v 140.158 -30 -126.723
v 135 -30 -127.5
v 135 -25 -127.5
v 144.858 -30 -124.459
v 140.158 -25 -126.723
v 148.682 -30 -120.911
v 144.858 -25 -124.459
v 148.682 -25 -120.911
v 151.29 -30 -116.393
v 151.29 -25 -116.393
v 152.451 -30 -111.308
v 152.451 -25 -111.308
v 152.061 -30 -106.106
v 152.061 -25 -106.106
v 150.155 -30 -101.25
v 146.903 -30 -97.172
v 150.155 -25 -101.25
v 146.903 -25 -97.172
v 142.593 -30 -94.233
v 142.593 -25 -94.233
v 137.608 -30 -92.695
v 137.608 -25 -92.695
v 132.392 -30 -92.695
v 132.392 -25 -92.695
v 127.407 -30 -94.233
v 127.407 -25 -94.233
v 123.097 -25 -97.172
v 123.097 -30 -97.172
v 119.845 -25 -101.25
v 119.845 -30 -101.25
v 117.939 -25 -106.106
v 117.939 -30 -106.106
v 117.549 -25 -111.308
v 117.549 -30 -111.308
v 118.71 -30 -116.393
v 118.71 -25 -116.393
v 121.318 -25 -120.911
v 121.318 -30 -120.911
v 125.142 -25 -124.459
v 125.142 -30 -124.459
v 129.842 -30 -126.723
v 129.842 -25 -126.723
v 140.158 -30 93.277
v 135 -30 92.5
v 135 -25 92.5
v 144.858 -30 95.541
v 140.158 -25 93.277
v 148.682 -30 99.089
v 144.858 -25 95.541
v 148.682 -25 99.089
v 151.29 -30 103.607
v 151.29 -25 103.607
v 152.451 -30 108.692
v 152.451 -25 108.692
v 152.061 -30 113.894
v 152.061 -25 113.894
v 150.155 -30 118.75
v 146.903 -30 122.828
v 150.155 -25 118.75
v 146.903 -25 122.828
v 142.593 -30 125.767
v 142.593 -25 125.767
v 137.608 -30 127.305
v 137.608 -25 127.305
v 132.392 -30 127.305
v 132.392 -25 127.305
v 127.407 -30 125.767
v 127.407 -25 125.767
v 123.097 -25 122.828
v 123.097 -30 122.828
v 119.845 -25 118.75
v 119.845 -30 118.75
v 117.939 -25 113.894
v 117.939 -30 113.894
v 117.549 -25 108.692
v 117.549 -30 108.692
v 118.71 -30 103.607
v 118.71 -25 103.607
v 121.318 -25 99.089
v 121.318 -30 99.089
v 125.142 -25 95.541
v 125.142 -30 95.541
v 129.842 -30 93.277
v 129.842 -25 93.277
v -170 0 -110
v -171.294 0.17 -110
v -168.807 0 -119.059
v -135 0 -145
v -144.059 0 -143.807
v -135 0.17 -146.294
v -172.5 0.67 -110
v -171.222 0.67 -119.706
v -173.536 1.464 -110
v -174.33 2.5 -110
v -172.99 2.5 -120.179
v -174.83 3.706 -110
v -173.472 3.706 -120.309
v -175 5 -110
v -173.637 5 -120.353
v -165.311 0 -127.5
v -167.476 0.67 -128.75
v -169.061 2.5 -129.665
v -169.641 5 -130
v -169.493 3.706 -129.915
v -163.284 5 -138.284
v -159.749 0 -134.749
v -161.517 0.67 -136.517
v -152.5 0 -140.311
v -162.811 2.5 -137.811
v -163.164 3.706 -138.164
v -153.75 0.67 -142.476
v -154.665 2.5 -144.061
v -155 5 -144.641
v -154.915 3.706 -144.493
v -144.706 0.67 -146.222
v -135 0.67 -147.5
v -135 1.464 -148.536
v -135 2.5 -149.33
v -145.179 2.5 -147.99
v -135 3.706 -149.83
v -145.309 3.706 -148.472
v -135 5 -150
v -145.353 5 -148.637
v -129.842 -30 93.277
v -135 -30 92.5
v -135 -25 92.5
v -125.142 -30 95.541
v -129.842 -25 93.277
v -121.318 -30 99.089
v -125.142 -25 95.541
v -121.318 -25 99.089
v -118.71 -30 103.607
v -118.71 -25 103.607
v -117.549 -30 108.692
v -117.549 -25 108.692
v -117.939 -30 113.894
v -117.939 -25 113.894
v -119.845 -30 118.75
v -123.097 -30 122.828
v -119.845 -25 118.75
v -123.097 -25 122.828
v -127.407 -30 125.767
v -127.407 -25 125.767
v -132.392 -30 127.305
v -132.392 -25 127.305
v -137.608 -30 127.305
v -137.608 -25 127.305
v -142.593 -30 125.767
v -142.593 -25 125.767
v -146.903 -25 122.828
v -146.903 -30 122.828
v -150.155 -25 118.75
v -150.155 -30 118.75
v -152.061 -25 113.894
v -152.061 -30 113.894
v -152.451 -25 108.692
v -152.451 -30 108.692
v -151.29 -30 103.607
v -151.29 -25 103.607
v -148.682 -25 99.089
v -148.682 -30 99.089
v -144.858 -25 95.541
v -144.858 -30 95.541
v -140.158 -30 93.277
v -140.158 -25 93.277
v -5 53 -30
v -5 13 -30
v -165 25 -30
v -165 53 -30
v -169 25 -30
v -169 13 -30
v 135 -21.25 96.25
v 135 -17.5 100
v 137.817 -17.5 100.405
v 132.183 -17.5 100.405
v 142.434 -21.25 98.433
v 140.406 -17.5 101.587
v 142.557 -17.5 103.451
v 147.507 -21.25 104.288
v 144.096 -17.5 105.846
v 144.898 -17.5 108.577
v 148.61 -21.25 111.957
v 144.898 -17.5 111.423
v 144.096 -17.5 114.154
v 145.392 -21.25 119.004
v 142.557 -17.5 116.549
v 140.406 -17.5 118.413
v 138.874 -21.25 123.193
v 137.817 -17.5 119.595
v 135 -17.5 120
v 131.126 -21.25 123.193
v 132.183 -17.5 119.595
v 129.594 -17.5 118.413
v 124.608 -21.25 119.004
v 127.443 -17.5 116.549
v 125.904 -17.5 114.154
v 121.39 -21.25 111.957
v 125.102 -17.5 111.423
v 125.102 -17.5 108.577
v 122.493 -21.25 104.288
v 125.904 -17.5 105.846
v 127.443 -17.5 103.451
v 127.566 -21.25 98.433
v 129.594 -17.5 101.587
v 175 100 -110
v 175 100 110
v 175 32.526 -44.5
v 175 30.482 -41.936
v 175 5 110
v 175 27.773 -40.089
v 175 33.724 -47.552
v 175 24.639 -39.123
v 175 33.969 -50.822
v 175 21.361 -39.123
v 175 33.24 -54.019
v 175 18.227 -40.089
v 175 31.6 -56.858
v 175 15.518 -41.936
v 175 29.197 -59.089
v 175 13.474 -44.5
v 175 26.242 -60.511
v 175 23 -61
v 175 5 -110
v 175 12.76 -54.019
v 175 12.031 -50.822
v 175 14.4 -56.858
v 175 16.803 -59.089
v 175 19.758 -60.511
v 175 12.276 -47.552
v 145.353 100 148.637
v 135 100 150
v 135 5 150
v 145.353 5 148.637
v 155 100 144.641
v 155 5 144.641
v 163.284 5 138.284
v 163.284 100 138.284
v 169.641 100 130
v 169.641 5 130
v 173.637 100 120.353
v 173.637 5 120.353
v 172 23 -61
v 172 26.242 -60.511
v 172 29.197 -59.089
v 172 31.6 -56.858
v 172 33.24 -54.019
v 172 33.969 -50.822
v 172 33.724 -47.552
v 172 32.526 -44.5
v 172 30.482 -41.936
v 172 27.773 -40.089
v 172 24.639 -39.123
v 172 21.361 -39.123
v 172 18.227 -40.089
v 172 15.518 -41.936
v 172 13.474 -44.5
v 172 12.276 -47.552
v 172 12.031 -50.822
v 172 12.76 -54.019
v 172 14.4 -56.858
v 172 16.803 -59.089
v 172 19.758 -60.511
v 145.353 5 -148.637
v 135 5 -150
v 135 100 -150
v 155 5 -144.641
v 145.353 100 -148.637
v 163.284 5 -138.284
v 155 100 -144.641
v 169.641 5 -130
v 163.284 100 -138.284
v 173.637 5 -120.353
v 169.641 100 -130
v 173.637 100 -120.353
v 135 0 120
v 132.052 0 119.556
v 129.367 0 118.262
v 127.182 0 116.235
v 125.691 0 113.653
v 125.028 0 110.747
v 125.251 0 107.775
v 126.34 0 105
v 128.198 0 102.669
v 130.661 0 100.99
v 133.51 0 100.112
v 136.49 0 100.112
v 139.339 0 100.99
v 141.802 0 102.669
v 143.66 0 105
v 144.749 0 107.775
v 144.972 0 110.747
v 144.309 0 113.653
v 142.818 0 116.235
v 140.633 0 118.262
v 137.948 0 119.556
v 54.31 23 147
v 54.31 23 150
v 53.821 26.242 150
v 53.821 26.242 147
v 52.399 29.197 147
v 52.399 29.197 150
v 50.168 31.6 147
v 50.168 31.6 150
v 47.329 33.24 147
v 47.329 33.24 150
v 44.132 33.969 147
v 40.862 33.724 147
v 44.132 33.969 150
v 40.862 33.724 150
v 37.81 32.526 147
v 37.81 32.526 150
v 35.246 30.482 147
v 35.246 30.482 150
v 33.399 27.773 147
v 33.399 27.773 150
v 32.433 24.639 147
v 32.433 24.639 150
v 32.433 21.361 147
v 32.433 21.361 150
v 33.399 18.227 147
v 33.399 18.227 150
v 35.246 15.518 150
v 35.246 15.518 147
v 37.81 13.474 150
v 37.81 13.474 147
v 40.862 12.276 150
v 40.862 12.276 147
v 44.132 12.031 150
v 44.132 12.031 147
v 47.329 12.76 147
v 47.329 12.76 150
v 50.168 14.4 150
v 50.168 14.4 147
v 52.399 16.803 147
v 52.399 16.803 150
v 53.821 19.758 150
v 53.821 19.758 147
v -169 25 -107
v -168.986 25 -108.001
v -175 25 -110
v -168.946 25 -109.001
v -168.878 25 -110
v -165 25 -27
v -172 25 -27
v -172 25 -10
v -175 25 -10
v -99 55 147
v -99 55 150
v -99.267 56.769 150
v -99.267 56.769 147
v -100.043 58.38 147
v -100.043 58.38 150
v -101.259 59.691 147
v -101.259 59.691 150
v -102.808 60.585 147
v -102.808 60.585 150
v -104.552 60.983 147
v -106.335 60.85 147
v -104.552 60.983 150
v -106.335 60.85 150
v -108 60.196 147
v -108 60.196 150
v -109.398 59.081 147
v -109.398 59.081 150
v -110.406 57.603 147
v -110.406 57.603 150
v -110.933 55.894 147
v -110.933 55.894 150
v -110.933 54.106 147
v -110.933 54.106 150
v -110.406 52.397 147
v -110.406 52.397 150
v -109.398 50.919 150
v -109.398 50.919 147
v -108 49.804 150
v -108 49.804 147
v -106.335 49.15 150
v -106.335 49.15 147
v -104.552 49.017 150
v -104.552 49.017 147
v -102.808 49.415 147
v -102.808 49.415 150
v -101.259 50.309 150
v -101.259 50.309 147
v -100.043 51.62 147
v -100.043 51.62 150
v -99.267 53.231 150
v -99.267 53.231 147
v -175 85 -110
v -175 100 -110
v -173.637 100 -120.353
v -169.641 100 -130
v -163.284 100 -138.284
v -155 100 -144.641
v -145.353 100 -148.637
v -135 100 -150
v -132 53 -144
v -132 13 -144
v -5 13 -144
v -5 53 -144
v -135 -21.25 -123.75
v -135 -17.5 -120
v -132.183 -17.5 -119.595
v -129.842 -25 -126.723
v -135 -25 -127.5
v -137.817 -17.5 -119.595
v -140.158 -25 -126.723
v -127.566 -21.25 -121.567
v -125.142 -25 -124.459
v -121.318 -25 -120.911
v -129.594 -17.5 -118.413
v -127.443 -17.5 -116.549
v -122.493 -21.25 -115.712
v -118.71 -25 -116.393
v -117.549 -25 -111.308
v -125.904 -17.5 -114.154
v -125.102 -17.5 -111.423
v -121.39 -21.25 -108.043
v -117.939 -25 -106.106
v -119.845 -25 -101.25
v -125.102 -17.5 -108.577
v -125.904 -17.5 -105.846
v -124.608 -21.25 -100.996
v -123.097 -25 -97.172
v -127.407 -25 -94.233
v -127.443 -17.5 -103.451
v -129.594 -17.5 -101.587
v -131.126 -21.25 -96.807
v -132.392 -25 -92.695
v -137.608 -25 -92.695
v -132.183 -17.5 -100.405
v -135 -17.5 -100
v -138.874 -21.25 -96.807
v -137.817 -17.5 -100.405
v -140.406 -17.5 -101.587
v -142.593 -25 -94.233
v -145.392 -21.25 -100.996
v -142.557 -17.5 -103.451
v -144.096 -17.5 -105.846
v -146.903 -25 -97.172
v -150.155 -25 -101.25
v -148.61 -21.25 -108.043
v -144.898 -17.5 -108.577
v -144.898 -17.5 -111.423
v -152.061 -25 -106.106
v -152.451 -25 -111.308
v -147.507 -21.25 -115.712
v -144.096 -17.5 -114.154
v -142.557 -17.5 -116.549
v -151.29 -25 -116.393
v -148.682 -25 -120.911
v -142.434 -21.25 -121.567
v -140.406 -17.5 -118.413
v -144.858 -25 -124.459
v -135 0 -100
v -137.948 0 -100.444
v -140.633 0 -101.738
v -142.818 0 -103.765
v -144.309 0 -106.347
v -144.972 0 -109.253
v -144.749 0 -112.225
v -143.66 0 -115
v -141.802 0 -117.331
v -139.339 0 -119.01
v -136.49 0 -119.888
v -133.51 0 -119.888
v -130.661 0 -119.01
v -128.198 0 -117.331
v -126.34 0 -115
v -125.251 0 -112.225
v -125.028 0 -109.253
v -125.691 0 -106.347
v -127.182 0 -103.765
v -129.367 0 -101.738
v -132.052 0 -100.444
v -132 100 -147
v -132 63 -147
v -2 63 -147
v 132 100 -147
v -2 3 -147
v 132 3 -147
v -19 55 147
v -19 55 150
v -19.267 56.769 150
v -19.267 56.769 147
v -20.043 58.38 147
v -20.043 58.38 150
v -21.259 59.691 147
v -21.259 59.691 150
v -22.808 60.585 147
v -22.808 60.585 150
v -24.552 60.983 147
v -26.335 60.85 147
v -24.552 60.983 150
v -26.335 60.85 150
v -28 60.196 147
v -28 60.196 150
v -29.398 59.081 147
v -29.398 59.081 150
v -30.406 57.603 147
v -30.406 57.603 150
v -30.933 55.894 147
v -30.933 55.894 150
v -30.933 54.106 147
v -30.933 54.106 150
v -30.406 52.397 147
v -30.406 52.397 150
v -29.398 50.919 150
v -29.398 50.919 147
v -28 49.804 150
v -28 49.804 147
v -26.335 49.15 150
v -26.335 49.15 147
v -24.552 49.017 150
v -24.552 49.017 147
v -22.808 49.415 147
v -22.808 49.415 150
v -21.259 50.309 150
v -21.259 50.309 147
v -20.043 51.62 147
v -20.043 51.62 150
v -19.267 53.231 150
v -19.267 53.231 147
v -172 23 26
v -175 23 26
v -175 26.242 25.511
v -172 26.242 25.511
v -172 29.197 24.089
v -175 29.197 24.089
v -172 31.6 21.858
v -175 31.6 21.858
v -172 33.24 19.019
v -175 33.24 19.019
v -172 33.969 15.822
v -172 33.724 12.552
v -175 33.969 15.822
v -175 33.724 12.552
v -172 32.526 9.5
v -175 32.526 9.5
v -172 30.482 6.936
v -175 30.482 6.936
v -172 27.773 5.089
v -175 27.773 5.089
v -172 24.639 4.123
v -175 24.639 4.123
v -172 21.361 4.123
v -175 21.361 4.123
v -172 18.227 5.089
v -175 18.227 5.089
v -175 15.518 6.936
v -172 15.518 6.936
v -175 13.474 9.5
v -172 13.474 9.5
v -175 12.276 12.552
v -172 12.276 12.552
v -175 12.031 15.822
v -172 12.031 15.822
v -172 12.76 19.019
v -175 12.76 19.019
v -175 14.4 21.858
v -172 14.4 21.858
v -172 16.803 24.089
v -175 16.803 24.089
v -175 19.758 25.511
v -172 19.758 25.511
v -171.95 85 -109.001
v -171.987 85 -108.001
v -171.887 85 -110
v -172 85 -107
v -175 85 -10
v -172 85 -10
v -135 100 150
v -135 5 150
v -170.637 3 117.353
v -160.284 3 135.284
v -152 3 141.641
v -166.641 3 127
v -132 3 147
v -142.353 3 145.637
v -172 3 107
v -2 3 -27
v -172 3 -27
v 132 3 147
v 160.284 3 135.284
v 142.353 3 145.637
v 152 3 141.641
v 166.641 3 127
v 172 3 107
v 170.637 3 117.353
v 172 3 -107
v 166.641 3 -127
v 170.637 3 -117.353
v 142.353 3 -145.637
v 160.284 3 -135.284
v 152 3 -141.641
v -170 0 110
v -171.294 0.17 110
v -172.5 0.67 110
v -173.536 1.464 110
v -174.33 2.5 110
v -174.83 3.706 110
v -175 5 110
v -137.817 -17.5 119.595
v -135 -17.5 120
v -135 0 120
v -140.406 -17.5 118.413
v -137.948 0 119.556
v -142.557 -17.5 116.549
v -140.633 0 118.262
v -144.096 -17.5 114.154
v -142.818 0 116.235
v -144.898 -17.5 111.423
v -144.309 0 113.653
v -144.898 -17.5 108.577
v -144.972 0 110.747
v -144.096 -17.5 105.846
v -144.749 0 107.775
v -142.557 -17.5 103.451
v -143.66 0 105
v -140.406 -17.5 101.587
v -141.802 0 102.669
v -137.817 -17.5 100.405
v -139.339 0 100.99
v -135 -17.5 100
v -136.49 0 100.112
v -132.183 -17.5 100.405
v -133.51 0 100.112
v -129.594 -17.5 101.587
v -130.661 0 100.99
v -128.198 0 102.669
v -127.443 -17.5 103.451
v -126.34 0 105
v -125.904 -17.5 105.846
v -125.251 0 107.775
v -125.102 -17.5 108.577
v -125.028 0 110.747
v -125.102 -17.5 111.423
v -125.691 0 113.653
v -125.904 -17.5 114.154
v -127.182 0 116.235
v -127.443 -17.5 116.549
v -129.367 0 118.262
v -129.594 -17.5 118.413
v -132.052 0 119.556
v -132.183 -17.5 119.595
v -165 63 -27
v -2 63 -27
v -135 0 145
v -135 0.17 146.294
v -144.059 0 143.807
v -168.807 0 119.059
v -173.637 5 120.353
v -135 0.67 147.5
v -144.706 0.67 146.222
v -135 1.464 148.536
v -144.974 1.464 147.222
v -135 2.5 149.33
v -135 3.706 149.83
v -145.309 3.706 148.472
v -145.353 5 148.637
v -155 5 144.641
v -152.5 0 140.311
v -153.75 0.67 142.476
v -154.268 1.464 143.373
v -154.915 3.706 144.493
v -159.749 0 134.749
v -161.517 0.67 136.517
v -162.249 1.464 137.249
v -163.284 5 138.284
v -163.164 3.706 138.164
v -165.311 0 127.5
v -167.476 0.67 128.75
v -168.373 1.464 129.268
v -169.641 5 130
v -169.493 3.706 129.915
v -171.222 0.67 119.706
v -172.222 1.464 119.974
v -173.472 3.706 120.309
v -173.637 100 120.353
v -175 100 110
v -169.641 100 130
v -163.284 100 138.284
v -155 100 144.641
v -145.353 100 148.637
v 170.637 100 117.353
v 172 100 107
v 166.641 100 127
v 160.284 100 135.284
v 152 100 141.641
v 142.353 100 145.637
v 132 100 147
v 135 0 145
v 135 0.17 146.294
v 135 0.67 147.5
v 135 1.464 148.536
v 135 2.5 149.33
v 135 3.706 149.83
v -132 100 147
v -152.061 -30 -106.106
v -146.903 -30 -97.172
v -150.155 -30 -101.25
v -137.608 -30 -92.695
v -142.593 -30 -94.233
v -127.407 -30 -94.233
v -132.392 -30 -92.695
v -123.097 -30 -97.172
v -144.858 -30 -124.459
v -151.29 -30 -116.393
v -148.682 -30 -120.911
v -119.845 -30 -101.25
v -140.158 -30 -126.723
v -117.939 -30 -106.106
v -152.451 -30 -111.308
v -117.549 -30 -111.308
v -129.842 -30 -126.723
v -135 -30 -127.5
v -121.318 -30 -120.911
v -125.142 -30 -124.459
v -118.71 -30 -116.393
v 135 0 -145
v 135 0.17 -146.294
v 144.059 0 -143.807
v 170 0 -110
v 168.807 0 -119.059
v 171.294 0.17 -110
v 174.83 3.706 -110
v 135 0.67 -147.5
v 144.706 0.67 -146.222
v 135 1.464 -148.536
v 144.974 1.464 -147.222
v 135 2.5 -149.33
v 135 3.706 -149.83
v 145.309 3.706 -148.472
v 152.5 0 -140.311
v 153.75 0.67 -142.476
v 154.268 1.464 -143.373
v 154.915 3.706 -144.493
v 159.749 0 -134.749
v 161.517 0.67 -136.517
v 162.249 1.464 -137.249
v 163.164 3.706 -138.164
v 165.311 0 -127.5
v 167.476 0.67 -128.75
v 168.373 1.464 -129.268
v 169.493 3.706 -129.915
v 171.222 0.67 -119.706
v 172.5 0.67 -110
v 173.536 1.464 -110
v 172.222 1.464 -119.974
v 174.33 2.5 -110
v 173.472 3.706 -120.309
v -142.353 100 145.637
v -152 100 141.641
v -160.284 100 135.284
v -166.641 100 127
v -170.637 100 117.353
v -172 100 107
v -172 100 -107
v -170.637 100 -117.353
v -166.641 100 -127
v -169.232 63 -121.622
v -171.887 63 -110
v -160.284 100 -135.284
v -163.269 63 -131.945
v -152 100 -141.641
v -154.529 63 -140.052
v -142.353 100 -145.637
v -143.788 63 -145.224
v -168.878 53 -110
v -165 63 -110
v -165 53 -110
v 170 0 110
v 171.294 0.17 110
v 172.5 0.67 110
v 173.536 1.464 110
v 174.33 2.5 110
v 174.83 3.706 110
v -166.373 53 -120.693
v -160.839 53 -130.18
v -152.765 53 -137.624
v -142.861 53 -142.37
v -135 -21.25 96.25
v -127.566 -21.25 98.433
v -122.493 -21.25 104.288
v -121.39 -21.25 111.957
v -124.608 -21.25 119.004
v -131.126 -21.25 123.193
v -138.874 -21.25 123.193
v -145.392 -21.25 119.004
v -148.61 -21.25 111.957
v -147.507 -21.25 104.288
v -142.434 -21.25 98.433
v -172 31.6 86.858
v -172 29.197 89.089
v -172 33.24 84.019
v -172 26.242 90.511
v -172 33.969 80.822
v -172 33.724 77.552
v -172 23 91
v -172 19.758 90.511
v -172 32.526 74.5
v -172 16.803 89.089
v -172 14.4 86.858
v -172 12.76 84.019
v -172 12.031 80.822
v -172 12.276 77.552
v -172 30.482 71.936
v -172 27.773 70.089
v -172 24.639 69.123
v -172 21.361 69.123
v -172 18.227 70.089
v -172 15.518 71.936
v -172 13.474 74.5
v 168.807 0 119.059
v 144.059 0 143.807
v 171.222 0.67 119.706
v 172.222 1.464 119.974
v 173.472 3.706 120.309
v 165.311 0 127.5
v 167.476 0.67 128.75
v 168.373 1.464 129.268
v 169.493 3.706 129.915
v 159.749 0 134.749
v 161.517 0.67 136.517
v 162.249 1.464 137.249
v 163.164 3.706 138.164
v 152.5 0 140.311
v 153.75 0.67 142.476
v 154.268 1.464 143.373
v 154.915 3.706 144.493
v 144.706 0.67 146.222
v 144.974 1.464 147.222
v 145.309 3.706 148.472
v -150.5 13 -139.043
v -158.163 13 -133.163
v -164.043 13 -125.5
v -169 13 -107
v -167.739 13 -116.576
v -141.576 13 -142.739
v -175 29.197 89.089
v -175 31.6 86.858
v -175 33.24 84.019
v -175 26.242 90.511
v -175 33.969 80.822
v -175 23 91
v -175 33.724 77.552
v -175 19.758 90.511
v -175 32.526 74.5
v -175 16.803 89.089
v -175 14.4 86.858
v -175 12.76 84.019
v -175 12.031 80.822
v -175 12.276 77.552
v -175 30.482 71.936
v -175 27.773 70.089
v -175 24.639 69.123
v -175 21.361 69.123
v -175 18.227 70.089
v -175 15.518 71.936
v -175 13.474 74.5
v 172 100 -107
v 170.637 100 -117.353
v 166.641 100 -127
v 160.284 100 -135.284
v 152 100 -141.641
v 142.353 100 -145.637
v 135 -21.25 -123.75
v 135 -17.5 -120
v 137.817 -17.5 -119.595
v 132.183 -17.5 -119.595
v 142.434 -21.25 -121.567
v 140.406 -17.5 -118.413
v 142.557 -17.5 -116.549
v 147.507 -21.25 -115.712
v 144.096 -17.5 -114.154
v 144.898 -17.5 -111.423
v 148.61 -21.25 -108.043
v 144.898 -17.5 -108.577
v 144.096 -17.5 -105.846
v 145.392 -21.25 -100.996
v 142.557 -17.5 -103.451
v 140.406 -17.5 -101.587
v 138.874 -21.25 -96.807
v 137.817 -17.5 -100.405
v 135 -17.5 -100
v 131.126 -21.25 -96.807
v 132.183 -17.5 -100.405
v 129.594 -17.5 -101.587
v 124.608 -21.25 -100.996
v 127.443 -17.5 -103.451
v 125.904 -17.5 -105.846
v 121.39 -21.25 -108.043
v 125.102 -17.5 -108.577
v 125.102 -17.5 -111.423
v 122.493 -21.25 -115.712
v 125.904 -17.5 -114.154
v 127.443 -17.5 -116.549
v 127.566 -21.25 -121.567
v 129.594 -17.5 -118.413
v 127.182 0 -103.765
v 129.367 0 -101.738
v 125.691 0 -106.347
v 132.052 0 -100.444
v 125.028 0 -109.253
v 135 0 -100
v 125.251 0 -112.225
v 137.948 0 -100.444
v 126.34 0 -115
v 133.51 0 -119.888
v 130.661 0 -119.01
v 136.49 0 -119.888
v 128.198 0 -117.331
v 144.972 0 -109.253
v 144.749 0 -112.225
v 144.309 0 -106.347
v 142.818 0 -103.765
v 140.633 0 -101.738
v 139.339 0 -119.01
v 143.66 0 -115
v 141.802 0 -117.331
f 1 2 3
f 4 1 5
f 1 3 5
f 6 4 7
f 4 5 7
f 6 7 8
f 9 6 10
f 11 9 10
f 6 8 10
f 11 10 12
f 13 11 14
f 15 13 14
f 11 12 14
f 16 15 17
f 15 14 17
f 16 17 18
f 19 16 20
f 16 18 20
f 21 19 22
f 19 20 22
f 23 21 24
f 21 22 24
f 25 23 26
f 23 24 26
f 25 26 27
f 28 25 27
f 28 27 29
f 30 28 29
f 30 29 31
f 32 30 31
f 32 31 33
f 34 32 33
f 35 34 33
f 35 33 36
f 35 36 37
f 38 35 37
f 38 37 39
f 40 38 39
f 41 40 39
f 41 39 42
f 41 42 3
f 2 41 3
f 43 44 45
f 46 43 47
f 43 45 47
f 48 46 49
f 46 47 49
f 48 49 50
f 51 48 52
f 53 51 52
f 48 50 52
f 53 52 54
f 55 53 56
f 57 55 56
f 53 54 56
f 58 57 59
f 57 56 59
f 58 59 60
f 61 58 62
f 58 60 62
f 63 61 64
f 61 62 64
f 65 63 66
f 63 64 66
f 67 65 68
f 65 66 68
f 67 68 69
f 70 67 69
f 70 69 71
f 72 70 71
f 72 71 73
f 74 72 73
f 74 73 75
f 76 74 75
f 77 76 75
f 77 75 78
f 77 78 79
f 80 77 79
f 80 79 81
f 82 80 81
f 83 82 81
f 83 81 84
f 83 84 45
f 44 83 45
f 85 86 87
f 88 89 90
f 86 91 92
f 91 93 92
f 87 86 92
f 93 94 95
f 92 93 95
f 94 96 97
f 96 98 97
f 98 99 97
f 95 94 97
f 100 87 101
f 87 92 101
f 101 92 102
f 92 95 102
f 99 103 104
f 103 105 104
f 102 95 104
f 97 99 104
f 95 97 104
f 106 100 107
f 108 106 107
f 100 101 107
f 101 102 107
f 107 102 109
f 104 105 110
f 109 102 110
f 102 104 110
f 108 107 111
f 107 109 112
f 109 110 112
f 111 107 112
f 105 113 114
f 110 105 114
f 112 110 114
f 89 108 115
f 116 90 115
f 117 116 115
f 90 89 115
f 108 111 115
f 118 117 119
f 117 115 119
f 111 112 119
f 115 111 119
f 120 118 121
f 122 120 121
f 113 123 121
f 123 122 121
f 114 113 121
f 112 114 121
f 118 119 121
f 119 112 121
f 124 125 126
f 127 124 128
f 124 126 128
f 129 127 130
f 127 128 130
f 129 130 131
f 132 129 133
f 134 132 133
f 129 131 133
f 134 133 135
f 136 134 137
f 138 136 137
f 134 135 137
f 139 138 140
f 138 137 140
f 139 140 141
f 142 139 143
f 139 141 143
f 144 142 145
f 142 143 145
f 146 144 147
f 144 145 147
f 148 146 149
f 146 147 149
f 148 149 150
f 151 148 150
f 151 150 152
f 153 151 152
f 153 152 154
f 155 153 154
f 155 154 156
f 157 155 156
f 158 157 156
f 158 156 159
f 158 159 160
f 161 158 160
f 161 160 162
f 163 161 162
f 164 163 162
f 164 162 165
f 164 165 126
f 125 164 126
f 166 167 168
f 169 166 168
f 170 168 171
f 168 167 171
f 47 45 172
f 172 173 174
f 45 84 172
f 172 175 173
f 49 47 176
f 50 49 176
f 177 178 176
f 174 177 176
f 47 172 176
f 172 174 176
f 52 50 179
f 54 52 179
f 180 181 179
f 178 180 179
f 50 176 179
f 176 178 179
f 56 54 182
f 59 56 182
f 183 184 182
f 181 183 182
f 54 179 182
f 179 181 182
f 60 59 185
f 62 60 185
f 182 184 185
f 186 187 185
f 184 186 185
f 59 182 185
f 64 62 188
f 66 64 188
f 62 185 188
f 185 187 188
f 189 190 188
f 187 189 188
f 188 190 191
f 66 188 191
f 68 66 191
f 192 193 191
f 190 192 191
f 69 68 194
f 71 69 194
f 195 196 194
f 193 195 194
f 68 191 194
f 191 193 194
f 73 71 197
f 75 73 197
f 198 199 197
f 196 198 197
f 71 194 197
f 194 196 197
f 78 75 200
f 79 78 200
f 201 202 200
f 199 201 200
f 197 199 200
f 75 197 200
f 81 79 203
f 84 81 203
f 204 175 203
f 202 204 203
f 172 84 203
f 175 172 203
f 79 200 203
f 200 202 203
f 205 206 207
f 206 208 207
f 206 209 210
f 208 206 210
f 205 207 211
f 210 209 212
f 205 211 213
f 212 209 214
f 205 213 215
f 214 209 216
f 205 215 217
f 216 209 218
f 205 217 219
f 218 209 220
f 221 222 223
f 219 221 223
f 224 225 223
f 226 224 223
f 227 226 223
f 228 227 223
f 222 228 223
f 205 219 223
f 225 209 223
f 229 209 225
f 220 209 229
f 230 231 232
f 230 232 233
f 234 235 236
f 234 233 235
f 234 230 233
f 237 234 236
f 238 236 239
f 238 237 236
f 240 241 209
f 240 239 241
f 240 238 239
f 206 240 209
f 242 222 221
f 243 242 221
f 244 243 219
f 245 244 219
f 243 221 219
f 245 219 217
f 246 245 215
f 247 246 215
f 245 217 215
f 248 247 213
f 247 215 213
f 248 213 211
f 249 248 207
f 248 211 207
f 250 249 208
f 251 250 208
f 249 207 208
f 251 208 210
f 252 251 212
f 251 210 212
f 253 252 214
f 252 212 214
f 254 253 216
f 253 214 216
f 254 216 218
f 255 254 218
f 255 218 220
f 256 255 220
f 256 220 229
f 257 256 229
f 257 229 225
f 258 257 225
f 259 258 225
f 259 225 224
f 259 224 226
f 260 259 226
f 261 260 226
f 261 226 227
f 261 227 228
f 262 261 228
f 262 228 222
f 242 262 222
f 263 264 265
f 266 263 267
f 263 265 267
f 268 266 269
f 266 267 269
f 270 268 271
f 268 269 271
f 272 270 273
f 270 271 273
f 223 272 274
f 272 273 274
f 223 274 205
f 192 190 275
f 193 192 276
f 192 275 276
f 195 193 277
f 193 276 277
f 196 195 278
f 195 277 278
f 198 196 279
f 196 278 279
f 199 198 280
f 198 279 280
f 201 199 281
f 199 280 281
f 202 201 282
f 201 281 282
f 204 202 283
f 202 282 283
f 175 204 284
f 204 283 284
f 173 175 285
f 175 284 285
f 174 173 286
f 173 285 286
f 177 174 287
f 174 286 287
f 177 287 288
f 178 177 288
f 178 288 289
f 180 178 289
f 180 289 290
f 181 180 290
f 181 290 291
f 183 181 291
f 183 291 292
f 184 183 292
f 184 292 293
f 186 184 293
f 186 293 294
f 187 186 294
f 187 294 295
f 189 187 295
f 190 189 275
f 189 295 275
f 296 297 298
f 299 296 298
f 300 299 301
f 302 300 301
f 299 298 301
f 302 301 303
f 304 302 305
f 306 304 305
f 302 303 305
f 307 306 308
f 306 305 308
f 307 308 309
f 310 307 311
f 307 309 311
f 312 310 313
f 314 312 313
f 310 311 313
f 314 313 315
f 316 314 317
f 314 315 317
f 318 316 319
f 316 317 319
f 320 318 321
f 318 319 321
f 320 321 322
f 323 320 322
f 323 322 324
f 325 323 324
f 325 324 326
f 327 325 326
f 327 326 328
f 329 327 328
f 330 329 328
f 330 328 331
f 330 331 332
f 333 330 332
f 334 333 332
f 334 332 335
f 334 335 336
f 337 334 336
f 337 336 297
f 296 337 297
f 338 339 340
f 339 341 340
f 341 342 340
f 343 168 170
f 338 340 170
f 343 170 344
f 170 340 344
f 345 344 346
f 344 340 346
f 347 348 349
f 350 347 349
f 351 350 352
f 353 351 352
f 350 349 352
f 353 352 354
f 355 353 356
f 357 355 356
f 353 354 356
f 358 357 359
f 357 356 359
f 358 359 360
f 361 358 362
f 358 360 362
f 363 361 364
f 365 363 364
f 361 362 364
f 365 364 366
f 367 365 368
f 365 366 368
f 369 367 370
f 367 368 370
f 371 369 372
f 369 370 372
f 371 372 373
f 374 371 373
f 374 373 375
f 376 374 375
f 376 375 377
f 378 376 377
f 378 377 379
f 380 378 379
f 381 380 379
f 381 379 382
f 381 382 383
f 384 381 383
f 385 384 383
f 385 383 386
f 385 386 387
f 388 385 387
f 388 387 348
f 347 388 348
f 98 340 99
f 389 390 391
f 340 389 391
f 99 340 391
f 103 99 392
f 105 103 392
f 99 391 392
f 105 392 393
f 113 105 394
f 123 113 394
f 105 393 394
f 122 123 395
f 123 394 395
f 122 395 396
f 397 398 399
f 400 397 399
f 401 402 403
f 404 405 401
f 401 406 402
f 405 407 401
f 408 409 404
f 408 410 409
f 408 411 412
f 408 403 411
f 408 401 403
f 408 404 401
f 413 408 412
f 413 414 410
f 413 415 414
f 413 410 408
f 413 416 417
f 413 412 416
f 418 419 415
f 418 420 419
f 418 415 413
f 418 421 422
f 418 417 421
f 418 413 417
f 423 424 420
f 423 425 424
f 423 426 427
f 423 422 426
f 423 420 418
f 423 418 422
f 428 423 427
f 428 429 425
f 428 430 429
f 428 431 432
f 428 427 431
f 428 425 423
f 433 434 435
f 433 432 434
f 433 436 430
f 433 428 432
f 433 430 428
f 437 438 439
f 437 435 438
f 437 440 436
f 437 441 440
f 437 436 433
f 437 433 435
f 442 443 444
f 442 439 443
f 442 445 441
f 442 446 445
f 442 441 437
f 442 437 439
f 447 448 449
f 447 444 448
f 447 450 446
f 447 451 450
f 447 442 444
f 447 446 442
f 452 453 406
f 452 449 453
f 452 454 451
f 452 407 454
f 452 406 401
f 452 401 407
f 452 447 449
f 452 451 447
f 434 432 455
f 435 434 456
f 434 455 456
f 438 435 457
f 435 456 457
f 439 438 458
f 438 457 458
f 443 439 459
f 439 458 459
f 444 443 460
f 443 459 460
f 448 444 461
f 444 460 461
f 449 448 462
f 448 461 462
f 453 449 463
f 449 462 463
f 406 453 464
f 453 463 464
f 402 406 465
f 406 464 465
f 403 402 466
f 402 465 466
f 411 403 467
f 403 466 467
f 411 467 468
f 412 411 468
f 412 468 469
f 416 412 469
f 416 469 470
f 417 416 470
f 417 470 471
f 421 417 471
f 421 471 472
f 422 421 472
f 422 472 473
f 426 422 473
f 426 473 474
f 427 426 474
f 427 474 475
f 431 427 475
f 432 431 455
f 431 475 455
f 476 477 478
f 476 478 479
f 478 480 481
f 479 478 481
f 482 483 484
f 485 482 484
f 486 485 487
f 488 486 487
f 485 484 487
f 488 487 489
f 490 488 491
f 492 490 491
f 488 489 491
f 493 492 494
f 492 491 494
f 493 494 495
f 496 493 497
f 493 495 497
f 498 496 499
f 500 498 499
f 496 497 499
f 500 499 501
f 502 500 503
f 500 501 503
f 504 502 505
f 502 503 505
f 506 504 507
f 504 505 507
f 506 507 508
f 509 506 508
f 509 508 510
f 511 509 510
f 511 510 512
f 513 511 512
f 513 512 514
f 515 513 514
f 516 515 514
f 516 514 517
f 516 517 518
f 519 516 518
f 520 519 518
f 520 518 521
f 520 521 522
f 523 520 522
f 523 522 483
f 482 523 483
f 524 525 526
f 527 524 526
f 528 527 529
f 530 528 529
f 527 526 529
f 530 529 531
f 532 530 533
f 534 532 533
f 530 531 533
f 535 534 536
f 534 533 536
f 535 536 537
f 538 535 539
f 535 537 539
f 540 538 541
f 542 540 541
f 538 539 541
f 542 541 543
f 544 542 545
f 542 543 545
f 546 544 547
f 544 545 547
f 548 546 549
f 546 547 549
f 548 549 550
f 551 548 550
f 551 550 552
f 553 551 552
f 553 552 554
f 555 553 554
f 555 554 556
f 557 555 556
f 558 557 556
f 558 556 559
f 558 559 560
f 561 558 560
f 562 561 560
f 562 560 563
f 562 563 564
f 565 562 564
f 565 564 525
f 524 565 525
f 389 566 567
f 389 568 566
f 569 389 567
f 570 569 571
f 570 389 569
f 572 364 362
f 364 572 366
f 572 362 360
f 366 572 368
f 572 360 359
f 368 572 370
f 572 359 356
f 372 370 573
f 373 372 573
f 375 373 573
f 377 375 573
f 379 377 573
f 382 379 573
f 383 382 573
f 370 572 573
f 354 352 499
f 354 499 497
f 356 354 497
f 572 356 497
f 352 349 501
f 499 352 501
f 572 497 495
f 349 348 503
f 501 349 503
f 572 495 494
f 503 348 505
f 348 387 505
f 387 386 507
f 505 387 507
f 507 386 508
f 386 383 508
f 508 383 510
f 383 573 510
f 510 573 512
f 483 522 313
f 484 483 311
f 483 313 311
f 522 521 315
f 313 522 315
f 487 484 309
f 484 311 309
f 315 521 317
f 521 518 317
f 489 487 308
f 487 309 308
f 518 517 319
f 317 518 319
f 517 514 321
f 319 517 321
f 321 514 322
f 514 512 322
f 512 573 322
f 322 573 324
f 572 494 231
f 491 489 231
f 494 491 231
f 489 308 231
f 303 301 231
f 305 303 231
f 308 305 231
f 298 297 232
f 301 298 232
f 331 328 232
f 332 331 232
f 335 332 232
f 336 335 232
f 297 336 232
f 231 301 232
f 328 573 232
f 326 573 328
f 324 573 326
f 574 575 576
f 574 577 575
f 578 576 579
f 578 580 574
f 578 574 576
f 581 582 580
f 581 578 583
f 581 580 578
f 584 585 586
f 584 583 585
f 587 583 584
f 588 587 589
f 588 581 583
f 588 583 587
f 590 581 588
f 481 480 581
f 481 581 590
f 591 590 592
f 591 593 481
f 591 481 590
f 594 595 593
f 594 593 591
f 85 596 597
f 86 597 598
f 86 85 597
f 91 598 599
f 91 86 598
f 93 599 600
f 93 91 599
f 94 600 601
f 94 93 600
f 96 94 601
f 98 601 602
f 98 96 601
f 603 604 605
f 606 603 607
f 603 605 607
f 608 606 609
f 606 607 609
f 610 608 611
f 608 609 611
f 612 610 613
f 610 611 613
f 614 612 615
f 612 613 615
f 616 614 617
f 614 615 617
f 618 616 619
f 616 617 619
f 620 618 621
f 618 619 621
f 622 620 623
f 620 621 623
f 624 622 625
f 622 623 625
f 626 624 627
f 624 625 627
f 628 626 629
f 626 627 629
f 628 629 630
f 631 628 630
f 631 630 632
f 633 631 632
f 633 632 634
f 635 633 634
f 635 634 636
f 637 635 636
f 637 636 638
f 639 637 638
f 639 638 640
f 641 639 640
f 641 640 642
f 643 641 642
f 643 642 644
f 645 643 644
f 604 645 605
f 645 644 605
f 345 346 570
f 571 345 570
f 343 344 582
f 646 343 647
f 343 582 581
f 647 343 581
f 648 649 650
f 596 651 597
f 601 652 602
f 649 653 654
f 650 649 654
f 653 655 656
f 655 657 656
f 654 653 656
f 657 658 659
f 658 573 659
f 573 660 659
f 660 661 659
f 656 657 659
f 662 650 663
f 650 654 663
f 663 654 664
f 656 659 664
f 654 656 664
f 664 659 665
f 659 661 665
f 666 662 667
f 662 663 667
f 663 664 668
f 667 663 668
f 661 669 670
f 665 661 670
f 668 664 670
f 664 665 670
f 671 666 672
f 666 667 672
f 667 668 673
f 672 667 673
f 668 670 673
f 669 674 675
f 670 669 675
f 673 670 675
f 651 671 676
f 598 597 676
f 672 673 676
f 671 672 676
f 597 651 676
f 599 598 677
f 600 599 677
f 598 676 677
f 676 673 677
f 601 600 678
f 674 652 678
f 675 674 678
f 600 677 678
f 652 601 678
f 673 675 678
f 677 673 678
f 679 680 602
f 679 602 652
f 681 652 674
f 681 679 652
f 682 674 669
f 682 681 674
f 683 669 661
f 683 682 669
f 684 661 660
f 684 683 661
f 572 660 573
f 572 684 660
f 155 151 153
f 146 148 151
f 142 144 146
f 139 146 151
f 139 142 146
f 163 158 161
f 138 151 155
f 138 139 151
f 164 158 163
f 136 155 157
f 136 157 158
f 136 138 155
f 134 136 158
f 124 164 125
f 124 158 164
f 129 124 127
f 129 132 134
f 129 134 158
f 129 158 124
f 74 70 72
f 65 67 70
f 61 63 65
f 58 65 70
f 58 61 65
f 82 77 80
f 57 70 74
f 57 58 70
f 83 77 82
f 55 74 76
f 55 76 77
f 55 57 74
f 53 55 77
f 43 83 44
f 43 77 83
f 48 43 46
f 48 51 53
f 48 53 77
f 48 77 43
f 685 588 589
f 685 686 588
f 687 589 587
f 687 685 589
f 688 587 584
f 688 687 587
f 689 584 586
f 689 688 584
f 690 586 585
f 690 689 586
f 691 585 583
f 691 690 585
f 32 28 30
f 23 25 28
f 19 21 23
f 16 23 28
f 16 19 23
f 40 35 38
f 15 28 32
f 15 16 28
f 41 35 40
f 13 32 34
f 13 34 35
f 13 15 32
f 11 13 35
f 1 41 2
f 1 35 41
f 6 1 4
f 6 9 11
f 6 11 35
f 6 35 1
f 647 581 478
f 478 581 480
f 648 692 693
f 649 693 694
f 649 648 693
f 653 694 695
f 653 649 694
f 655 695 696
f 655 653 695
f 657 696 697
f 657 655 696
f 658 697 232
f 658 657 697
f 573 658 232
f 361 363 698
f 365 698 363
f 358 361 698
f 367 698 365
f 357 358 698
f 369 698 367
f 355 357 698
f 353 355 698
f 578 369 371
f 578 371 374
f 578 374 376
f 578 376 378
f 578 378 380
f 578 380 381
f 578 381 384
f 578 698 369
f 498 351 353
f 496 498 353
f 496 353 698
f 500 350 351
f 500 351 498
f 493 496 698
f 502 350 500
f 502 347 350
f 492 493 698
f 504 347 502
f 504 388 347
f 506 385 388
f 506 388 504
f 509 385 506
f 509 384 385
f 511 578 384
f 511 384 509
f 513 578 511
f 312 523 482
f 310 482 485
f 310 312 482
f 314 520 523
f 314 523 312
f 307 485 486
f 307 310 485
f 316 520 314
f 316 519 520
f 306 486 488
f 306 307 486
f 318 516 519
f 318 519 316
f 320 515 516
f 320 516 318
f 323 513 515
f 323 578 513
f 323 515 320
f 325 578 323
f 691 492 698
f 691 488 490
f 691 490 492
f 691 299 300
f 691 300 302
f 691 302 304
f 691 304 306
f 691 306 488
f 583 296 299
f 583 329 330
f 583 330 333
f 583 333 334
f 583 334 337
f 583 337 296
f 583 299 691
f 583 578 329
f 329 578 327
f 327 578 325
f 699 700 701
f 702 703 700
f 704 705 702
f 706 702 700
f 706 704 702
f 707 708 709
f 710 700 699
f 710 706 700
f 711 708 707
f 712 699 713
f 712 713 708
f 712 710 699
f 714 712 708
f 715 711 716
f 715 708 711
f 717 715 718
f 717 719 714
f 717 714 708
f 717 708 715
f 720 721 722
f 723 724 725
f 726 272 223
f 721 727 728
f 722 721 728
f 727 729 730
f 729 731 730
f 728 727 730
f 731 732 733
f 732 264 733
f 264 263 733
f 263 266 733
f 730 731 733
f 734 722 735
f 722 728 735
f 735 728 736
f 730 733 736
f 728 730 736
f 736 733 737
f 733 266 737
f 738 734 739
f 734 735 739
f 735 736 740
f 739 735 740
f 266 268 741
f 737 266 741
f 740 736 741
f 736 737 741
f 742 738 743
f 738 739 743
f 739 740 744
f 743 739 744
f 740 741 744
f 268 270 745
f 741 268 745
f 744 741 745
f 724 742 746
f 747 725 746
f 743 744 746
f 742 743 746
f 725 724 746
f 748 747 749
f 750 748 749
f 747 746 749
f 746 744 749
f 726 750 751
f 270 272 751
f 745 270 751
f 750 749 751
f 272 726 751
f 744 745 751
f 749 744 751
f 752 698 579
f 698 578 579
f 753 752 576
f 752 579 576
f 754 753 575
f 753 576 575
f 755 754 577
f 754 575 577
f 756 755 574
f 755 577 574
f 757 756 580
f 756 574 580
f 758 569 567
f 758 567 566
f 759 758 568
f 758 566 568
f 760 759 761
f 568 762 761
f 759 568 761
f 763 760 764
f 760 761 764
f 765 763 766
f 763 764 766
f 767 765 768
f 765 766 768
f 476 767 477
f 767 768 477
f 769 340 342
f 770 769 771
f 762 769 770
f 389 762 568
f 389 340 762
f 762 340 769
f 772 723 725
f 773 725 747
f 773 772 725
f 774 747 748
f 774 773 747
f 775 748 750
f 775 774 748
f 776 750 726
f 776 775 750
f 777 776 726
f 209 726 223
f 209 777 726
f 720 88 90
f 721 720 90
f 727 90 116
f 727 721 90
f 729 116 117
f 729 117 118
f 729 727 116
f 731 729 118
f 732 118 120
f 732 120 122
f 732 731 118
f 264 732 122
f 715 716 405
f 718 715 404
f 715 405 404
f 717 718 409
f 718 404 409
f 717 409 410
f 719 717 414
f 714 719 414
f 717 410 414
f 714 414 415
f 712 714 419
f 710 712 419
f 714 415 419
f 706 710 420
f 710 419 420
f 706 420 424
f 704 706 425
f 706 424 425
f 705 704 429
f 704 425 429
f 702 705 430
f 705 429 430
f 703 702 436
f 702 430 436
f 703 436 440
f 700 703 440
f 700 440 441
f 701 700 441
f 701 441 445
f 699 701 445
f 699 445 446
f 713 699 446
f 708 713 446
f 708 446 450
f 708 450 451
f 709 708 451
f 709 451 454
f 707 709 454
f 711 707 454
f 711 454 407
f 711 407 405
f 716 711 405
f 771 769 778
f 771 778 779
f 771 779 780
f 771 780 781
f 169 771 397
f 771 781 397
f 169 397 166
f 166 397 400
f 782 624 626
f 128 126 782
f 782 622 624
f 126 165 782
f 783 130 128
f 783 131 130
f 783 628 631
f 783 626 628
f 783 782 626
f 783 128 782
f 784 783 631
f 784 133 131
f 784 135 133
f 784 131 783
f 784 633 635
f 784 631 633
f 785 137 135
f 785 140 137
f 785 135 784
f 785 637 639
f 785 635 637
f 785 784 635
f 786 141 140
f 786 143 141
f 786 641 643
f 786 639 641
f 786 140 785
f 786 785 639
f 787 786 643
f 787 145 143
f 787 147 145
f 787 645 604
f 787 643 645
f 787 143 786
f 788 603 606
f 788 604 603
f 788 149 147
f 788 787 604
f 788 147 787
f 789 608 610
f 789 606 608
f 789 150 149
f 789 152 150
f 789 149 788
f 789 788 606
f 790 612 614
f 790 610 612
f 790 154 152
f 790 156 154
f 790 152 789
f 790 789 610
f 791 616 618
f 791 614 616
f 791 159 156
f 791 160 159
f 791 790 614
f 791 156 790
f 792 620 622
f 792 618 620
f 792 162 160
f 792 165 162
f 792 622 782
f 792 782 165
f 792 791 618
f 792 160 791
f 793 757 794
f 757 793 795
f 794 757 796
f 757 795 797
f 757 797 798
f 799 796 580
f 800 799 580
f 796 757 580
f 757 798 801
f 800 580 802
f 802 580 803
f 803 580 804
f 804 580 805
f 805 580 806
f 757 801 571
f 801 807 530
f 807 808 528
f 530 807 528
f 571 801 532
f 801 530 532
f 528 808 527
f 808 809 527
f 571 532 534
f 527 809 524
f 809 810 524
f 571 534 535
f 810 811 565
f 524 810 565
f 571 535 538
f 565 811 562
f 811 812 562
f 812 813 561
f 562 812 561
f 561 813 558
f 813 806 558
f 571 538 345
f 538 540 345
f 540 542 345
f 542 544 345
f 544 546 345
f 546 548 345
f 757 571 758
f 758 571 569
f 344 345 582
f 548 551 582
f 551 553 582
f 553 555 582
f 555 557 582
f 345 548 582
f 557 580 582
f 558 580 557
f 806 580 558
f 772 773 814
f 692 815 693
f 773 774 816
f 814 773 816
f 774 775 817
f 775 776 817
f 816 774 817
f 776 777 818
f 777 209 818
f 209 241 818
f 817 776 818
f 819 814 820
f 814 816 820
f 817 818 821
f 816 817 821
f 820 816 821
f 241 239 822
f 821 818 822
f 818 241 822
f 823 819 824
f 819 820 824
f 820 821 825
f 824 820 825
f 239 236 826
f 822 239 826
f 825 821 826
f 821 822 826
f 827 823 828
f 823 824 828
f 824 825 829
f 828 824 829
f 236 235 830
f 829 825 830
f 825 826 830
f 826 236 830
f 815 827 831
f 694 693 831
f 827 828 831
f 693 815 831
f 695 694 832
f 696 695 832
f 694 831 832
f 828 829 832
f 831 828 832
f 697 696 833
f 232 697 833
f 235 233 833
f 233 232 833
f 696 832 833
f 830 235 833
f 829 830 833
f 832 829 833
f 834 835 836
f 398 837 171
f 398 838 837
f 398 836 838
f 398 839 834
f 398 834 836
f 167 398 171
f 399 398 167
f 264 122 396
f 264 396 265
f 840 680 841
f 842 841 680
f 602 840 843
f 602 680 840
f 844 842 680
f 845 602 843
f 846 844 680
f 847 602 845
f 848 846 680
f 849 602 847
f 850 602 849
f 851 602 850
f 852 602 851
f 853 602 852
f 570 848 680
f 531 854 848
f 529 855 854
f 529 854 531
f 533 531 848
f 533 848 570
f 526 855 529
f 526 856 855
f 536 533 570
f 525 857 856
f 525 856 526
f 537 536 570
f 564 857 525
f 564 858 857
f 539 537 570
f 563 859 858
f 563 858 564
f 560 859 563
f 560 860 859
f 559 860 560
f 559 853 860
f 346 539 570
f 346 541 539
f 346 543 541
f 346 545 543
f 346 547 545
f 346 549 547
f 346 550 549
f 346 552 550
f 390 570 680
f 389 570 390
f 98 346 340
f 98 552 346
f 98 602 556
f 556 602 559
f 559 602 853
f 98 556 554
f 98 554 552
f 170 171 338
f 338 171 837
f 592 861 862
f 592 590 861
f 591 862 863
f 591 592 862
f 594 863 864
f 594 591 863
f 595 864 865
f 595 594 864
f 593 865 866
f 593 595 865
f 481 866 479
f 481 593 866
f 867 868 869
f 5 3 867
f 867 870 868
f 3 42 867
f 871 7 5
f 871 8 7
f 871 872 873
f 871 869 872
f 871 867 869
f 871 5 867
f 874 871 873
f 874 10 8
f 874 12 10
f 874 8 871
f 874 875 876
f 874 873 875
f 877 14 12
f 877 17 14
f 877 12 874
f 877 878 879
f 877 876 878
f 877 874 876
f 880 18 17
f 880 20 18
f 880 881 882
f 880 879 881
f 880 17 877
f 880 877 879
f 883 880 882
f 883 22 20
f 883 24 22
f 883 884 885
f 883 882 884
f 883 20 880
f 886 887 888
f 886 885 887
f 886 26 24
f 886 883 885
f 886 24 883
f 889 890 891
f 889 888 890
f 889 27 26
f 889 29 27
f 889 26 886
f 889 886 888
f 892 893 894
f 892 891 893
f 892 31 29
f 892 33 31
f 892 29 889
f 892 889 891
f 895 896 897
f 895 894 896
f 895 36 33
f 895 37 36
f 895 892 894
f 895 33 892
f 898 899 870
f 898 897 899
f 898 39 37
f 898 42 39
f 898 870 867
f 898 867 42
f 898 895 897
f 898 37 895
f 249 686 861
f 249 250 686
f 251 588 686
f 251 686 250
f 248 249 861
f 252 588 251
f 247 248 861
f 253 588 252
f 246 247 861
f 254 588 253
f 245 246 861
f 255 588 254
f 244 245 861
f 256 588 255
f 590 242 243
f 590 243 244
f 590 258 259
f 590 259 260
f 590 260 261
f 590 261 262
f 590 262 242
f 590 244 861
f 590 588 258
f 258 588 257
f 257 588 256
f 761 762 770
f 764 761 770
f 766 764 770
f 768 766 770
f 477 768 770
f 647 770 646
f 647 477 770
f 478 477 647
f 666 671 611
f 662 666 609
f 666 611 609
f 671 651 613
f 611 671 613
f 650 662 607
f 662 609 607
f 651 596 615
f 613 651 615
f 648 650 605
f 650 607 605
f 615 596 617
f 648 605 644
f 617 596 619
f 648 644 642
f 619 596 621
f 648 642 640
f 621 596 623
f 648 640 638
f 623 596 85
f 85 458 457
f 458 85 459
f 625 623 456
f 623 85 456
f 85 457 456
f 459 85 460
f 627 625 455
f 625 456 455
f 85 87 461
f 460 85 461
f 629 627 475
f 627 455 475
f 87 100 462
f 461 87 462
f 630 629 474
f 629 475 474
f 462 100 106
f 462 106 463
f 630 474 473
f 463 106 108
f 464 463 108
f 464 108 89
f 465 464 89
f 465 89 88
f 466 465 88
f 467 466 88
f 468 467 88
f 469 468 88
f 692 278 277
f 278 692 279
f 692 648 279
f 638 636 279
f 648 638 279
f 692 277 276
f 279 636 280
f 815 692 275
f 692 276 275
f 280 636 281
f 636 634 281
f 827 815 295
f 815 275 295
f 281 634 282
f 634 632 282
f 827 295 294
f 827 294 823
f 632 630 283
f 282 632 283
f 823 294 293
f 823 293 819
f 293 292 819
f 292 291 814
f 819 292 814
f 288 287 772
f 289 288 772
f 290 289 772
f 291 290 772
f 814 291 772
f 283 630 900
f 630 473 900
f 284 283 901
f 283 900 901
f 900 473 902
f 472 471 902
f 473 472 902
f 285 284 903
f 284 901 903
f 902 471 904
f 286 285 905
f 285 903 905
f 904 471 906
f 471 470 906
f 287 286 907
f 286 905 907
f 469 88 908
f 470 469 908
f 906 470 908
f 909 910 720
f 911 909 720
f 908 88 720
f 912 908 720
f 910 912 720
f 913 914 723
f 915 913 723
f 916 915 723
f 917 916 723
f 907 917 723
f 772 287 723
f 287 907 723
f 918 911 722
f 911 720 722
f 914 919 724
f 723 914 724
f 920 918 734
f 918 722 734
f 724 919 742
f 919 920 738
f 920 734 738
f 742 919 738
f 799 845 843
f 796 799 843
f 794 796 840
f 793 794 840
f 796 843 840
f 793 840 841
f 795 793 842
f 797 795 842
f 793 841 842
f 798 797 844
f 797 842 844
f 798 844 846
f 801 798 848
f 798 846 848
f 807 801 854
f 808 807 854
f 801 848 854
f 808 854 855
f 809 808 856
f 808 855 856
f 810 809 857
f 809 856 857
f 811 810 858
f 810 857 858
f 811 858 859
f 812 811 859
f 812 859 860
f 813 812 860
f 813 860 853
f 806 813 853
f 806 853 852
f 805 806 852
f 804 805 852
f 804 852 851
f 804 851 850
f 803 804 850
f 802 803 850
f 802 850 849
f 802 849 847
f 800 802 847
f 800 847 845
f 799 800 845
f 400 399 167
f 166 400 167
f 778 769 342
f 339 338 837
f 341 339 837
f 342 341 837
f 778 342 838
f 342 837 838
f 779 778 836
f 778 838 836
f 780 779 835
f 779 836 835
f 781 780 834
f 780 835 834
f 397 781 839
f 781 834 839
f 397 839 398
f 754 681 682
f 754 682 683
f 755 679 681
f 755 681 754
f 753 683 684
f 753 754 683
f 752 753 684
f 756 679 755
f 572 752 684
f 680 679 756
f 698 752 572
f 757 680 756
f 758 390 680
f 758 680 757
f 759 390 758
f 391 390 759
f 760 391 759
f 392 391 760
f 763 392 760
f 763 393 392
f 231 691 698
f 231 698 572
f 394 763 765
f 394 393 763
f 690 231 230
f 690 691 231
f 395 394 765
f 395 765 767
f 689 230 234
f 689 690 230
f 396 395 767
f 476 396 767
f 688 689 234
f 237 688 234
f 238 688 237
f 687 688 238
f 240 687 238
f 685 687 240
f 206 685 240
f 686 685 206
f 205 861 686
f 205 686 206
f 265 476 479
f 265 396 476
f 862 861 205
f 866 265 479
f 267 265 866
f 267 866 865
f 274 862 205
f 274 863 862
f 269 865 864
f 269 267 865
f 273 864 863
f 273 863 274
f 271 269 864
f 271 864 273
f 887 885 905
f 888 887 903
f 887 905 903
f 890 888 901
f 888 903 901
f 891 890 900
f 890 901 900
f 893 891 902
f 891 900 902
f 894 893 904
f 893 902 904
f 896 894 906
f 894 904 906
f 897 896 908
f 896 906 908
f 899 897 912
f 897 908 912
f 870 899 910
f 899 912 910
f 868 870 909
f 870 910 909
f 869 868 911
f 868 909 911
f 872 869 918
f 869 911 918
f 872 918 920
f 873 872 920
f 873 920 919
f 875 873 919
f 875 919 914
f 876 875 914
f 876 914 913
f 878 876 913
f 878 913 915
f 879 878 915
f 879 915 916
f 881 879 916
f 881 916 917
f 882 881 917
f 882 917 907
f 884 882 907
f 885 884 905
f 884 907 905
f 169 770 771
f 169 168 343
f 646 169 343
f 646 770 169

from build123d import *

# Parameters (mm, degrees)
SKETCH1_W             = 350
SKETCH1_H             = 300
BOSS_EXTRUDE1_DEPTH   = 100
SHELL1_T              = -3
SKETCH2_R             = 11
CUT_EXTRUDE1_DEPTH    = 10
SKETCH3_R             = 11
CUT_EXTRUDE2_DEPTH    = 10
SKETCH4_R             = 11
CUT_EXTRUDE3_DEPTH    = 10
FILLET1_R             = 40
FILLET2_R             = 5
SKETCH5_R             = 10
BOSS_EXTRUDE2_DEPTH   = 15
SKETCH6_R             = 17.5
BOSS_EXTRUDE3_DEPTH   = 15
CHAMFER1_SIZE         = 10
EXTRUDE_THIN1_DEPTH   = 10
EXTRUDE_THIN1_START   = 50
EXTRUDE_THIN1_2_DEPTH = 10
EXTRUDE_THIN1_START_2 = 10
EXTRUDE_THIN1_3_DEPTH = 40
SKETCH8_W             = 100
SKETCH8_H             = 60
CUT_EXTRUDE4_DEPTH    = 10
SKETCH9_R             = 6
CUT_EXTRUDE5_DEPTH    = 10


# Read off the part's stored shape, not the designer's step: Extrude-Thin1
with BuildPart() as part:
    # Sketch1 → Boss-Extrude1 (new body)
    with BuildSketch(Plane(origin=(0, 0, 0), x_dir=(1, 0, 0), z_dir=(0, 1, 0))):
        Rectangle(SKETCH1_W, SKETCH1_H)
    extrude(amount=BOSS_EXTRUDE1_DEPTH)

    # Shell1
    shell1_openings = [part.faces().sort_by_distance(p)[0] for p in [
        (0, 100, 0),
    ]]
    offset(amount=SHELL1_T, openings=shell1_openings, kind=Kind.INTERSECTION)

    # Sketch2 → Cut-Extrude1 (cut)
    with BuildSketch(Plane.ZY.offset(175)):
        with Locations((80, 23)):
            Circle(SKETCH2_R)
        with Locations((15, 23)):
            Circle(SKETCH2_R)
    extrude(amount=-CUT_EXTRUDE1_DEPTH, mode=Mode.SUBTRACT)

    # Sketch3 → Cut-Extrude2 (cut)
    with BuildSketch(Plane.XY.offset(150)):
        with Locations((43.31, 23)):
            Circle(SKETCH3_R)
    extrude(amount=-CUT_EXTRUDE2_DEPTH, mode=Mode.SUBTRACT)

    # Sketch4 → Cut-Extrude3 (cut)
    with BuildSketch(Plane(origin=(175, 0, 0), x_dir=(0, 0, -1), z_dir=(1, 0, 0))):
        with Locations((50, 23)):
            Circle(SKETCH4_R)
    extrude(amount=-CUT_EXTRUDE3_DEPTH, mode=Mode.SUBTRACT)

    # Fillet1
    fillet1_edges = [part.edges().sort_by_distance(p)[0] for p in [
        (172, 51.5, 147),
        (172, 51.5, -147),
        (-172, 51.5, -147),
        (-172, 51.5, 147),
        (175, 50, 150),
        (-175, 50, 150),
        (-175, 50, -150),
        (175, 50, -150),
    ]]
    fillet(fillet1_edges, radius=FILLET1_R)

    # Fillet2
    fillet2_edges = [part.edges().sort_by_distance(p)[0] for p in [
        (0, 0, -150),
        (175, 0, 0),
        (0, 0, 150),
        (-175, 0, 0),
        (-163.284271247, 0, 138.284271247),
        (163.284271247, 0, 138.284271247),
        (-163.284271247, 0, -138.284271247),
        (163.284271247, 0, -138.284271247),
    ]]
    fillet(fillet2_edges, radius=FILLET2_R)

    # Sketch5 → Boss-Extrude2 (add)
    with BuildSketch(Plane.XZ):
        with Locations(Location((-135, -110, 0), (0, 0, 90))):
            Circle(SKETCH5_R)
        with Locations(Location((-135, 110, 0), (0, 0, 90))):
            Circle(SKETCH5_R)
        with Locations(Location((135, -110, 0), (0, 0, 90))):
            Circle(SKETCH5_R)
        with Locations(Location((135, 110, 0), (0, 0, 90))):
            Circle(SKETCH5_R)
    extrude(amount=BOSS_EXTRUDE2_DEPTH)

    # Sketch6 → Boss-Extrude3 (add)
    with BuildSketch(Plane.XZ.offset(15)):
        with Locations(Location((135, 110, 0), (0, 0, 270))):
            Circle(SKETCH6_R)
        with Locations(Location((135, -110, 0), (0, 0, 270))):
            Circle(SKETCH6_R)
        with Locations(Location((-135, 110, 0), (0, 0, 270))):
            Circle(SKETCH6_R)
        with Locations(Location((-135, -110, 0), (0, 0, 270))):
            Circle(SKETCH6_R)
    extrude(amount=BOSS_EXTRUDE3_DEPTH)

    # Chamfer1
    # the kernel refuses this chamfer: 10 mm, written as the material it takes off along each edge
    with BuildSketch(Plane(origin=(-135, -15, -110), x_dir=(0, 0, -1), z_dir=(-1, 0, 0))) as chamfer1_piece_1_section:
        Polygon((17.5 - CHAMFER1_SIZE, 0), (17.5, CHAMFER1_SIZE), (17.5, 0), align=None)
    chamfer1_piece_1 = revolve(axis=Axis((-135, -15, -110), (0, -1, 0)), mode=Mode.PRIVATE)
    chamfer1_piece_1 = chamfer1_piece_1 - Plane(origin=(-135, -21.273186291, -110), x_dir=(0, 0, 1), z_dir=(0, 1, 0)) * Cylinder(10, 70, mode=Mode.PRIVATE)
    add(chamfer1_piece_1, mode=Mode.SUBTRACT)
    with BuildSketch(Plane(origin=(-135, -15, 110), x_dir=(0, 0, -1), z_dir=(-1, 0, 0))) as chamfer1_piece_2_section:
        Polygon((17.5 - CHAMFER1_SIZE, 0), (17.5, CHAMFER1_SIZE), (17.5, 0), align=None)
    chamfer1_piece_2 = revolve(axis=Axis((-135, -15, 110), (0, -1, 0)), mode=Mode.PRIVATE)
    chamfer1_piece_2 = chamfer1_piece_2 - Plane(origin=(-135, -21.273186291, 110), x_dir=(0, 0, 1), z_dir=(0, 1, 0)) * Cylinder(10, 70, mode=Mode.PRIVATE)
    add(chamfer1_piece_2, mode=Mode.SUBTRACT)
    with BuildSketch(Plane(origin=(135, -15, -110), x_dir=(0, 0, -1), z_dir=(-1, 0, 0))) as chamfer1_piece_3_section:
        Polygon((17.5 - CHAMFER1_SIZE, 0), (17.5, CHAMFER1_SIZE), (17.5, 0), align=None)
    chamfer1_piece_3 = revolve(axis=Axis((135, -15, -110), (0, -1, 0)), mode=Mode.PRIVATE)
    chamfer1_piece_3 = chamfer1_piece_3 - Plane(origin=(135, -21.273186291, -110), x_dir=(0, 0, 1), z_dir=(0, 1, 0)) * Cylinder(10, 71, mode=Mode.PRIVATE)
    add(chamfer1_piece_3, mode=Mode.SUBTRACT)
    with BuildSketch(Plane(origin=(135, -15, 110), x_dir=(0, 0, -1), z_dir=(-1, 0, 0))) as chamfer1_piece_4_section:
        Polygon((17.5, CHAMFER1_SIZE), (17.5 - CHAMFER1_SIZE, 0), (17.5, 0), align=None)
    chamfer1_piece_4 = revolve(axis=Axis((135, -15, 110), (0, -1, 0)), mode=Mode.PRIVATE)
    chamfer1_piece_4 = chamfer1_piece_4 - Plane(origin=(135, -21.273186291, 110), x_dir=(0, 0, 1), z_dir=(0, 1, 0)) * Cylinder(10, 71, mode=Mode.PRIVATE)
    add(chamfer1_piece_4, mode=Mode.SUBTRACT)

    # Extrude-Thin1 outline → Extrude-Thin1 (add)
    with BuildSketch(Plane(origin=(0, 3, 0), x_dir=(1, 0, 0), z_dir=(0, 1, 0))):
        with BuildLine():
            Line((-172, 27), (-2, 27))
            Line((-2, 27), (-2, 147))
            Line((-2, 147), (-132, 147))
            ThreePointArc((-132, 147), (-160.284271247, 135.284271247), (-172, 107))
            Line((-172, 107), (-172, 27))
        make_face()
    extrude(amount=EXTRUDE_THIN1_DEPTH)

    # Extrude-Thin1 2 outline → Extrude-Thin1 2 (add)
    with BuildSketch(Plane(origin=(0, 3, 0), x_dir=(1, 0, 0), z_dir=(0, 1, 0)).offset(EXTRUDE_THIN1_START)):
        with BuildLine():
            Line((-172, 27), (-2, 27))
            Line((-2, 27), (-2, 147))
            Line((-2, 147), (-132, 147))
            ThreePointArc((-132, 147), (-160.284271247, 135.284271247), (-172, 107))
            Line((-172, 107), (-172, 27))
        make_face()
    extrude(amount=EXTRUDE_THIN1_2_DEPTH)

    # Extrude-Thin1 3 outline → Extrude-Thin1 3 (add)
    with BuildSketch(Plane(origin=(0, 3, 0), x_dir=(1, 0, 0), z_dir=(0, 1, 0)).offset(EXTRUDE_THIN1_START_2)):
        with BuildLine():
            Line((-172, 27), (-2, 27))
            Line((-2, 27), (-2, 147))
            Line((-2, 147), (-132, 147))
            ThreePointArc((-132, 147), (-160.284271247, 135.284271247), (-172, 107))
            Line((-172, 107), (-172, 27))
        make_face()
        with BuildLine():
            ThreePointArc((-169, 107), (-158.162950904, 133.162950904), (-132, 144))
            Line((-132, 144), (-5, 144))
            Line((-5, 144), (-5, 30))
            Line((-5, 30), (-169, 30))
            Line((-169, 30), (-169, 107))
        make_face(mode=Mode.SUBTRACT)
    extrude(amount=EXTRUDE_THIN1_3_DEPTH)

    # Sketch8 → Cut-Extrude4 (cut)
    with BuildSketch(Plane.ZY.offset(175)):
        with Locations((-60, 55)):
            Rectangle(SKETCH8_W, SKETCH8_H)
    extrude(amount=-CUT_EXTRUDE4_DEPTH, mode=Mode.SUBTRACT)

    # Sketch9 → Cut-Extrude5 (cut)
    with BuildSketch(Plane.XY.offset(150)):
        with Locations((-105, 55)):
            Circle(SKETCH9_R)
        with Locations((-25, 55)):
            Circle(SKETCH9_R)
    extrude(amount=-CUT_EXTRUDE5_DEPTH, mode=Mode.SUBTRACT)


solid = part.part
